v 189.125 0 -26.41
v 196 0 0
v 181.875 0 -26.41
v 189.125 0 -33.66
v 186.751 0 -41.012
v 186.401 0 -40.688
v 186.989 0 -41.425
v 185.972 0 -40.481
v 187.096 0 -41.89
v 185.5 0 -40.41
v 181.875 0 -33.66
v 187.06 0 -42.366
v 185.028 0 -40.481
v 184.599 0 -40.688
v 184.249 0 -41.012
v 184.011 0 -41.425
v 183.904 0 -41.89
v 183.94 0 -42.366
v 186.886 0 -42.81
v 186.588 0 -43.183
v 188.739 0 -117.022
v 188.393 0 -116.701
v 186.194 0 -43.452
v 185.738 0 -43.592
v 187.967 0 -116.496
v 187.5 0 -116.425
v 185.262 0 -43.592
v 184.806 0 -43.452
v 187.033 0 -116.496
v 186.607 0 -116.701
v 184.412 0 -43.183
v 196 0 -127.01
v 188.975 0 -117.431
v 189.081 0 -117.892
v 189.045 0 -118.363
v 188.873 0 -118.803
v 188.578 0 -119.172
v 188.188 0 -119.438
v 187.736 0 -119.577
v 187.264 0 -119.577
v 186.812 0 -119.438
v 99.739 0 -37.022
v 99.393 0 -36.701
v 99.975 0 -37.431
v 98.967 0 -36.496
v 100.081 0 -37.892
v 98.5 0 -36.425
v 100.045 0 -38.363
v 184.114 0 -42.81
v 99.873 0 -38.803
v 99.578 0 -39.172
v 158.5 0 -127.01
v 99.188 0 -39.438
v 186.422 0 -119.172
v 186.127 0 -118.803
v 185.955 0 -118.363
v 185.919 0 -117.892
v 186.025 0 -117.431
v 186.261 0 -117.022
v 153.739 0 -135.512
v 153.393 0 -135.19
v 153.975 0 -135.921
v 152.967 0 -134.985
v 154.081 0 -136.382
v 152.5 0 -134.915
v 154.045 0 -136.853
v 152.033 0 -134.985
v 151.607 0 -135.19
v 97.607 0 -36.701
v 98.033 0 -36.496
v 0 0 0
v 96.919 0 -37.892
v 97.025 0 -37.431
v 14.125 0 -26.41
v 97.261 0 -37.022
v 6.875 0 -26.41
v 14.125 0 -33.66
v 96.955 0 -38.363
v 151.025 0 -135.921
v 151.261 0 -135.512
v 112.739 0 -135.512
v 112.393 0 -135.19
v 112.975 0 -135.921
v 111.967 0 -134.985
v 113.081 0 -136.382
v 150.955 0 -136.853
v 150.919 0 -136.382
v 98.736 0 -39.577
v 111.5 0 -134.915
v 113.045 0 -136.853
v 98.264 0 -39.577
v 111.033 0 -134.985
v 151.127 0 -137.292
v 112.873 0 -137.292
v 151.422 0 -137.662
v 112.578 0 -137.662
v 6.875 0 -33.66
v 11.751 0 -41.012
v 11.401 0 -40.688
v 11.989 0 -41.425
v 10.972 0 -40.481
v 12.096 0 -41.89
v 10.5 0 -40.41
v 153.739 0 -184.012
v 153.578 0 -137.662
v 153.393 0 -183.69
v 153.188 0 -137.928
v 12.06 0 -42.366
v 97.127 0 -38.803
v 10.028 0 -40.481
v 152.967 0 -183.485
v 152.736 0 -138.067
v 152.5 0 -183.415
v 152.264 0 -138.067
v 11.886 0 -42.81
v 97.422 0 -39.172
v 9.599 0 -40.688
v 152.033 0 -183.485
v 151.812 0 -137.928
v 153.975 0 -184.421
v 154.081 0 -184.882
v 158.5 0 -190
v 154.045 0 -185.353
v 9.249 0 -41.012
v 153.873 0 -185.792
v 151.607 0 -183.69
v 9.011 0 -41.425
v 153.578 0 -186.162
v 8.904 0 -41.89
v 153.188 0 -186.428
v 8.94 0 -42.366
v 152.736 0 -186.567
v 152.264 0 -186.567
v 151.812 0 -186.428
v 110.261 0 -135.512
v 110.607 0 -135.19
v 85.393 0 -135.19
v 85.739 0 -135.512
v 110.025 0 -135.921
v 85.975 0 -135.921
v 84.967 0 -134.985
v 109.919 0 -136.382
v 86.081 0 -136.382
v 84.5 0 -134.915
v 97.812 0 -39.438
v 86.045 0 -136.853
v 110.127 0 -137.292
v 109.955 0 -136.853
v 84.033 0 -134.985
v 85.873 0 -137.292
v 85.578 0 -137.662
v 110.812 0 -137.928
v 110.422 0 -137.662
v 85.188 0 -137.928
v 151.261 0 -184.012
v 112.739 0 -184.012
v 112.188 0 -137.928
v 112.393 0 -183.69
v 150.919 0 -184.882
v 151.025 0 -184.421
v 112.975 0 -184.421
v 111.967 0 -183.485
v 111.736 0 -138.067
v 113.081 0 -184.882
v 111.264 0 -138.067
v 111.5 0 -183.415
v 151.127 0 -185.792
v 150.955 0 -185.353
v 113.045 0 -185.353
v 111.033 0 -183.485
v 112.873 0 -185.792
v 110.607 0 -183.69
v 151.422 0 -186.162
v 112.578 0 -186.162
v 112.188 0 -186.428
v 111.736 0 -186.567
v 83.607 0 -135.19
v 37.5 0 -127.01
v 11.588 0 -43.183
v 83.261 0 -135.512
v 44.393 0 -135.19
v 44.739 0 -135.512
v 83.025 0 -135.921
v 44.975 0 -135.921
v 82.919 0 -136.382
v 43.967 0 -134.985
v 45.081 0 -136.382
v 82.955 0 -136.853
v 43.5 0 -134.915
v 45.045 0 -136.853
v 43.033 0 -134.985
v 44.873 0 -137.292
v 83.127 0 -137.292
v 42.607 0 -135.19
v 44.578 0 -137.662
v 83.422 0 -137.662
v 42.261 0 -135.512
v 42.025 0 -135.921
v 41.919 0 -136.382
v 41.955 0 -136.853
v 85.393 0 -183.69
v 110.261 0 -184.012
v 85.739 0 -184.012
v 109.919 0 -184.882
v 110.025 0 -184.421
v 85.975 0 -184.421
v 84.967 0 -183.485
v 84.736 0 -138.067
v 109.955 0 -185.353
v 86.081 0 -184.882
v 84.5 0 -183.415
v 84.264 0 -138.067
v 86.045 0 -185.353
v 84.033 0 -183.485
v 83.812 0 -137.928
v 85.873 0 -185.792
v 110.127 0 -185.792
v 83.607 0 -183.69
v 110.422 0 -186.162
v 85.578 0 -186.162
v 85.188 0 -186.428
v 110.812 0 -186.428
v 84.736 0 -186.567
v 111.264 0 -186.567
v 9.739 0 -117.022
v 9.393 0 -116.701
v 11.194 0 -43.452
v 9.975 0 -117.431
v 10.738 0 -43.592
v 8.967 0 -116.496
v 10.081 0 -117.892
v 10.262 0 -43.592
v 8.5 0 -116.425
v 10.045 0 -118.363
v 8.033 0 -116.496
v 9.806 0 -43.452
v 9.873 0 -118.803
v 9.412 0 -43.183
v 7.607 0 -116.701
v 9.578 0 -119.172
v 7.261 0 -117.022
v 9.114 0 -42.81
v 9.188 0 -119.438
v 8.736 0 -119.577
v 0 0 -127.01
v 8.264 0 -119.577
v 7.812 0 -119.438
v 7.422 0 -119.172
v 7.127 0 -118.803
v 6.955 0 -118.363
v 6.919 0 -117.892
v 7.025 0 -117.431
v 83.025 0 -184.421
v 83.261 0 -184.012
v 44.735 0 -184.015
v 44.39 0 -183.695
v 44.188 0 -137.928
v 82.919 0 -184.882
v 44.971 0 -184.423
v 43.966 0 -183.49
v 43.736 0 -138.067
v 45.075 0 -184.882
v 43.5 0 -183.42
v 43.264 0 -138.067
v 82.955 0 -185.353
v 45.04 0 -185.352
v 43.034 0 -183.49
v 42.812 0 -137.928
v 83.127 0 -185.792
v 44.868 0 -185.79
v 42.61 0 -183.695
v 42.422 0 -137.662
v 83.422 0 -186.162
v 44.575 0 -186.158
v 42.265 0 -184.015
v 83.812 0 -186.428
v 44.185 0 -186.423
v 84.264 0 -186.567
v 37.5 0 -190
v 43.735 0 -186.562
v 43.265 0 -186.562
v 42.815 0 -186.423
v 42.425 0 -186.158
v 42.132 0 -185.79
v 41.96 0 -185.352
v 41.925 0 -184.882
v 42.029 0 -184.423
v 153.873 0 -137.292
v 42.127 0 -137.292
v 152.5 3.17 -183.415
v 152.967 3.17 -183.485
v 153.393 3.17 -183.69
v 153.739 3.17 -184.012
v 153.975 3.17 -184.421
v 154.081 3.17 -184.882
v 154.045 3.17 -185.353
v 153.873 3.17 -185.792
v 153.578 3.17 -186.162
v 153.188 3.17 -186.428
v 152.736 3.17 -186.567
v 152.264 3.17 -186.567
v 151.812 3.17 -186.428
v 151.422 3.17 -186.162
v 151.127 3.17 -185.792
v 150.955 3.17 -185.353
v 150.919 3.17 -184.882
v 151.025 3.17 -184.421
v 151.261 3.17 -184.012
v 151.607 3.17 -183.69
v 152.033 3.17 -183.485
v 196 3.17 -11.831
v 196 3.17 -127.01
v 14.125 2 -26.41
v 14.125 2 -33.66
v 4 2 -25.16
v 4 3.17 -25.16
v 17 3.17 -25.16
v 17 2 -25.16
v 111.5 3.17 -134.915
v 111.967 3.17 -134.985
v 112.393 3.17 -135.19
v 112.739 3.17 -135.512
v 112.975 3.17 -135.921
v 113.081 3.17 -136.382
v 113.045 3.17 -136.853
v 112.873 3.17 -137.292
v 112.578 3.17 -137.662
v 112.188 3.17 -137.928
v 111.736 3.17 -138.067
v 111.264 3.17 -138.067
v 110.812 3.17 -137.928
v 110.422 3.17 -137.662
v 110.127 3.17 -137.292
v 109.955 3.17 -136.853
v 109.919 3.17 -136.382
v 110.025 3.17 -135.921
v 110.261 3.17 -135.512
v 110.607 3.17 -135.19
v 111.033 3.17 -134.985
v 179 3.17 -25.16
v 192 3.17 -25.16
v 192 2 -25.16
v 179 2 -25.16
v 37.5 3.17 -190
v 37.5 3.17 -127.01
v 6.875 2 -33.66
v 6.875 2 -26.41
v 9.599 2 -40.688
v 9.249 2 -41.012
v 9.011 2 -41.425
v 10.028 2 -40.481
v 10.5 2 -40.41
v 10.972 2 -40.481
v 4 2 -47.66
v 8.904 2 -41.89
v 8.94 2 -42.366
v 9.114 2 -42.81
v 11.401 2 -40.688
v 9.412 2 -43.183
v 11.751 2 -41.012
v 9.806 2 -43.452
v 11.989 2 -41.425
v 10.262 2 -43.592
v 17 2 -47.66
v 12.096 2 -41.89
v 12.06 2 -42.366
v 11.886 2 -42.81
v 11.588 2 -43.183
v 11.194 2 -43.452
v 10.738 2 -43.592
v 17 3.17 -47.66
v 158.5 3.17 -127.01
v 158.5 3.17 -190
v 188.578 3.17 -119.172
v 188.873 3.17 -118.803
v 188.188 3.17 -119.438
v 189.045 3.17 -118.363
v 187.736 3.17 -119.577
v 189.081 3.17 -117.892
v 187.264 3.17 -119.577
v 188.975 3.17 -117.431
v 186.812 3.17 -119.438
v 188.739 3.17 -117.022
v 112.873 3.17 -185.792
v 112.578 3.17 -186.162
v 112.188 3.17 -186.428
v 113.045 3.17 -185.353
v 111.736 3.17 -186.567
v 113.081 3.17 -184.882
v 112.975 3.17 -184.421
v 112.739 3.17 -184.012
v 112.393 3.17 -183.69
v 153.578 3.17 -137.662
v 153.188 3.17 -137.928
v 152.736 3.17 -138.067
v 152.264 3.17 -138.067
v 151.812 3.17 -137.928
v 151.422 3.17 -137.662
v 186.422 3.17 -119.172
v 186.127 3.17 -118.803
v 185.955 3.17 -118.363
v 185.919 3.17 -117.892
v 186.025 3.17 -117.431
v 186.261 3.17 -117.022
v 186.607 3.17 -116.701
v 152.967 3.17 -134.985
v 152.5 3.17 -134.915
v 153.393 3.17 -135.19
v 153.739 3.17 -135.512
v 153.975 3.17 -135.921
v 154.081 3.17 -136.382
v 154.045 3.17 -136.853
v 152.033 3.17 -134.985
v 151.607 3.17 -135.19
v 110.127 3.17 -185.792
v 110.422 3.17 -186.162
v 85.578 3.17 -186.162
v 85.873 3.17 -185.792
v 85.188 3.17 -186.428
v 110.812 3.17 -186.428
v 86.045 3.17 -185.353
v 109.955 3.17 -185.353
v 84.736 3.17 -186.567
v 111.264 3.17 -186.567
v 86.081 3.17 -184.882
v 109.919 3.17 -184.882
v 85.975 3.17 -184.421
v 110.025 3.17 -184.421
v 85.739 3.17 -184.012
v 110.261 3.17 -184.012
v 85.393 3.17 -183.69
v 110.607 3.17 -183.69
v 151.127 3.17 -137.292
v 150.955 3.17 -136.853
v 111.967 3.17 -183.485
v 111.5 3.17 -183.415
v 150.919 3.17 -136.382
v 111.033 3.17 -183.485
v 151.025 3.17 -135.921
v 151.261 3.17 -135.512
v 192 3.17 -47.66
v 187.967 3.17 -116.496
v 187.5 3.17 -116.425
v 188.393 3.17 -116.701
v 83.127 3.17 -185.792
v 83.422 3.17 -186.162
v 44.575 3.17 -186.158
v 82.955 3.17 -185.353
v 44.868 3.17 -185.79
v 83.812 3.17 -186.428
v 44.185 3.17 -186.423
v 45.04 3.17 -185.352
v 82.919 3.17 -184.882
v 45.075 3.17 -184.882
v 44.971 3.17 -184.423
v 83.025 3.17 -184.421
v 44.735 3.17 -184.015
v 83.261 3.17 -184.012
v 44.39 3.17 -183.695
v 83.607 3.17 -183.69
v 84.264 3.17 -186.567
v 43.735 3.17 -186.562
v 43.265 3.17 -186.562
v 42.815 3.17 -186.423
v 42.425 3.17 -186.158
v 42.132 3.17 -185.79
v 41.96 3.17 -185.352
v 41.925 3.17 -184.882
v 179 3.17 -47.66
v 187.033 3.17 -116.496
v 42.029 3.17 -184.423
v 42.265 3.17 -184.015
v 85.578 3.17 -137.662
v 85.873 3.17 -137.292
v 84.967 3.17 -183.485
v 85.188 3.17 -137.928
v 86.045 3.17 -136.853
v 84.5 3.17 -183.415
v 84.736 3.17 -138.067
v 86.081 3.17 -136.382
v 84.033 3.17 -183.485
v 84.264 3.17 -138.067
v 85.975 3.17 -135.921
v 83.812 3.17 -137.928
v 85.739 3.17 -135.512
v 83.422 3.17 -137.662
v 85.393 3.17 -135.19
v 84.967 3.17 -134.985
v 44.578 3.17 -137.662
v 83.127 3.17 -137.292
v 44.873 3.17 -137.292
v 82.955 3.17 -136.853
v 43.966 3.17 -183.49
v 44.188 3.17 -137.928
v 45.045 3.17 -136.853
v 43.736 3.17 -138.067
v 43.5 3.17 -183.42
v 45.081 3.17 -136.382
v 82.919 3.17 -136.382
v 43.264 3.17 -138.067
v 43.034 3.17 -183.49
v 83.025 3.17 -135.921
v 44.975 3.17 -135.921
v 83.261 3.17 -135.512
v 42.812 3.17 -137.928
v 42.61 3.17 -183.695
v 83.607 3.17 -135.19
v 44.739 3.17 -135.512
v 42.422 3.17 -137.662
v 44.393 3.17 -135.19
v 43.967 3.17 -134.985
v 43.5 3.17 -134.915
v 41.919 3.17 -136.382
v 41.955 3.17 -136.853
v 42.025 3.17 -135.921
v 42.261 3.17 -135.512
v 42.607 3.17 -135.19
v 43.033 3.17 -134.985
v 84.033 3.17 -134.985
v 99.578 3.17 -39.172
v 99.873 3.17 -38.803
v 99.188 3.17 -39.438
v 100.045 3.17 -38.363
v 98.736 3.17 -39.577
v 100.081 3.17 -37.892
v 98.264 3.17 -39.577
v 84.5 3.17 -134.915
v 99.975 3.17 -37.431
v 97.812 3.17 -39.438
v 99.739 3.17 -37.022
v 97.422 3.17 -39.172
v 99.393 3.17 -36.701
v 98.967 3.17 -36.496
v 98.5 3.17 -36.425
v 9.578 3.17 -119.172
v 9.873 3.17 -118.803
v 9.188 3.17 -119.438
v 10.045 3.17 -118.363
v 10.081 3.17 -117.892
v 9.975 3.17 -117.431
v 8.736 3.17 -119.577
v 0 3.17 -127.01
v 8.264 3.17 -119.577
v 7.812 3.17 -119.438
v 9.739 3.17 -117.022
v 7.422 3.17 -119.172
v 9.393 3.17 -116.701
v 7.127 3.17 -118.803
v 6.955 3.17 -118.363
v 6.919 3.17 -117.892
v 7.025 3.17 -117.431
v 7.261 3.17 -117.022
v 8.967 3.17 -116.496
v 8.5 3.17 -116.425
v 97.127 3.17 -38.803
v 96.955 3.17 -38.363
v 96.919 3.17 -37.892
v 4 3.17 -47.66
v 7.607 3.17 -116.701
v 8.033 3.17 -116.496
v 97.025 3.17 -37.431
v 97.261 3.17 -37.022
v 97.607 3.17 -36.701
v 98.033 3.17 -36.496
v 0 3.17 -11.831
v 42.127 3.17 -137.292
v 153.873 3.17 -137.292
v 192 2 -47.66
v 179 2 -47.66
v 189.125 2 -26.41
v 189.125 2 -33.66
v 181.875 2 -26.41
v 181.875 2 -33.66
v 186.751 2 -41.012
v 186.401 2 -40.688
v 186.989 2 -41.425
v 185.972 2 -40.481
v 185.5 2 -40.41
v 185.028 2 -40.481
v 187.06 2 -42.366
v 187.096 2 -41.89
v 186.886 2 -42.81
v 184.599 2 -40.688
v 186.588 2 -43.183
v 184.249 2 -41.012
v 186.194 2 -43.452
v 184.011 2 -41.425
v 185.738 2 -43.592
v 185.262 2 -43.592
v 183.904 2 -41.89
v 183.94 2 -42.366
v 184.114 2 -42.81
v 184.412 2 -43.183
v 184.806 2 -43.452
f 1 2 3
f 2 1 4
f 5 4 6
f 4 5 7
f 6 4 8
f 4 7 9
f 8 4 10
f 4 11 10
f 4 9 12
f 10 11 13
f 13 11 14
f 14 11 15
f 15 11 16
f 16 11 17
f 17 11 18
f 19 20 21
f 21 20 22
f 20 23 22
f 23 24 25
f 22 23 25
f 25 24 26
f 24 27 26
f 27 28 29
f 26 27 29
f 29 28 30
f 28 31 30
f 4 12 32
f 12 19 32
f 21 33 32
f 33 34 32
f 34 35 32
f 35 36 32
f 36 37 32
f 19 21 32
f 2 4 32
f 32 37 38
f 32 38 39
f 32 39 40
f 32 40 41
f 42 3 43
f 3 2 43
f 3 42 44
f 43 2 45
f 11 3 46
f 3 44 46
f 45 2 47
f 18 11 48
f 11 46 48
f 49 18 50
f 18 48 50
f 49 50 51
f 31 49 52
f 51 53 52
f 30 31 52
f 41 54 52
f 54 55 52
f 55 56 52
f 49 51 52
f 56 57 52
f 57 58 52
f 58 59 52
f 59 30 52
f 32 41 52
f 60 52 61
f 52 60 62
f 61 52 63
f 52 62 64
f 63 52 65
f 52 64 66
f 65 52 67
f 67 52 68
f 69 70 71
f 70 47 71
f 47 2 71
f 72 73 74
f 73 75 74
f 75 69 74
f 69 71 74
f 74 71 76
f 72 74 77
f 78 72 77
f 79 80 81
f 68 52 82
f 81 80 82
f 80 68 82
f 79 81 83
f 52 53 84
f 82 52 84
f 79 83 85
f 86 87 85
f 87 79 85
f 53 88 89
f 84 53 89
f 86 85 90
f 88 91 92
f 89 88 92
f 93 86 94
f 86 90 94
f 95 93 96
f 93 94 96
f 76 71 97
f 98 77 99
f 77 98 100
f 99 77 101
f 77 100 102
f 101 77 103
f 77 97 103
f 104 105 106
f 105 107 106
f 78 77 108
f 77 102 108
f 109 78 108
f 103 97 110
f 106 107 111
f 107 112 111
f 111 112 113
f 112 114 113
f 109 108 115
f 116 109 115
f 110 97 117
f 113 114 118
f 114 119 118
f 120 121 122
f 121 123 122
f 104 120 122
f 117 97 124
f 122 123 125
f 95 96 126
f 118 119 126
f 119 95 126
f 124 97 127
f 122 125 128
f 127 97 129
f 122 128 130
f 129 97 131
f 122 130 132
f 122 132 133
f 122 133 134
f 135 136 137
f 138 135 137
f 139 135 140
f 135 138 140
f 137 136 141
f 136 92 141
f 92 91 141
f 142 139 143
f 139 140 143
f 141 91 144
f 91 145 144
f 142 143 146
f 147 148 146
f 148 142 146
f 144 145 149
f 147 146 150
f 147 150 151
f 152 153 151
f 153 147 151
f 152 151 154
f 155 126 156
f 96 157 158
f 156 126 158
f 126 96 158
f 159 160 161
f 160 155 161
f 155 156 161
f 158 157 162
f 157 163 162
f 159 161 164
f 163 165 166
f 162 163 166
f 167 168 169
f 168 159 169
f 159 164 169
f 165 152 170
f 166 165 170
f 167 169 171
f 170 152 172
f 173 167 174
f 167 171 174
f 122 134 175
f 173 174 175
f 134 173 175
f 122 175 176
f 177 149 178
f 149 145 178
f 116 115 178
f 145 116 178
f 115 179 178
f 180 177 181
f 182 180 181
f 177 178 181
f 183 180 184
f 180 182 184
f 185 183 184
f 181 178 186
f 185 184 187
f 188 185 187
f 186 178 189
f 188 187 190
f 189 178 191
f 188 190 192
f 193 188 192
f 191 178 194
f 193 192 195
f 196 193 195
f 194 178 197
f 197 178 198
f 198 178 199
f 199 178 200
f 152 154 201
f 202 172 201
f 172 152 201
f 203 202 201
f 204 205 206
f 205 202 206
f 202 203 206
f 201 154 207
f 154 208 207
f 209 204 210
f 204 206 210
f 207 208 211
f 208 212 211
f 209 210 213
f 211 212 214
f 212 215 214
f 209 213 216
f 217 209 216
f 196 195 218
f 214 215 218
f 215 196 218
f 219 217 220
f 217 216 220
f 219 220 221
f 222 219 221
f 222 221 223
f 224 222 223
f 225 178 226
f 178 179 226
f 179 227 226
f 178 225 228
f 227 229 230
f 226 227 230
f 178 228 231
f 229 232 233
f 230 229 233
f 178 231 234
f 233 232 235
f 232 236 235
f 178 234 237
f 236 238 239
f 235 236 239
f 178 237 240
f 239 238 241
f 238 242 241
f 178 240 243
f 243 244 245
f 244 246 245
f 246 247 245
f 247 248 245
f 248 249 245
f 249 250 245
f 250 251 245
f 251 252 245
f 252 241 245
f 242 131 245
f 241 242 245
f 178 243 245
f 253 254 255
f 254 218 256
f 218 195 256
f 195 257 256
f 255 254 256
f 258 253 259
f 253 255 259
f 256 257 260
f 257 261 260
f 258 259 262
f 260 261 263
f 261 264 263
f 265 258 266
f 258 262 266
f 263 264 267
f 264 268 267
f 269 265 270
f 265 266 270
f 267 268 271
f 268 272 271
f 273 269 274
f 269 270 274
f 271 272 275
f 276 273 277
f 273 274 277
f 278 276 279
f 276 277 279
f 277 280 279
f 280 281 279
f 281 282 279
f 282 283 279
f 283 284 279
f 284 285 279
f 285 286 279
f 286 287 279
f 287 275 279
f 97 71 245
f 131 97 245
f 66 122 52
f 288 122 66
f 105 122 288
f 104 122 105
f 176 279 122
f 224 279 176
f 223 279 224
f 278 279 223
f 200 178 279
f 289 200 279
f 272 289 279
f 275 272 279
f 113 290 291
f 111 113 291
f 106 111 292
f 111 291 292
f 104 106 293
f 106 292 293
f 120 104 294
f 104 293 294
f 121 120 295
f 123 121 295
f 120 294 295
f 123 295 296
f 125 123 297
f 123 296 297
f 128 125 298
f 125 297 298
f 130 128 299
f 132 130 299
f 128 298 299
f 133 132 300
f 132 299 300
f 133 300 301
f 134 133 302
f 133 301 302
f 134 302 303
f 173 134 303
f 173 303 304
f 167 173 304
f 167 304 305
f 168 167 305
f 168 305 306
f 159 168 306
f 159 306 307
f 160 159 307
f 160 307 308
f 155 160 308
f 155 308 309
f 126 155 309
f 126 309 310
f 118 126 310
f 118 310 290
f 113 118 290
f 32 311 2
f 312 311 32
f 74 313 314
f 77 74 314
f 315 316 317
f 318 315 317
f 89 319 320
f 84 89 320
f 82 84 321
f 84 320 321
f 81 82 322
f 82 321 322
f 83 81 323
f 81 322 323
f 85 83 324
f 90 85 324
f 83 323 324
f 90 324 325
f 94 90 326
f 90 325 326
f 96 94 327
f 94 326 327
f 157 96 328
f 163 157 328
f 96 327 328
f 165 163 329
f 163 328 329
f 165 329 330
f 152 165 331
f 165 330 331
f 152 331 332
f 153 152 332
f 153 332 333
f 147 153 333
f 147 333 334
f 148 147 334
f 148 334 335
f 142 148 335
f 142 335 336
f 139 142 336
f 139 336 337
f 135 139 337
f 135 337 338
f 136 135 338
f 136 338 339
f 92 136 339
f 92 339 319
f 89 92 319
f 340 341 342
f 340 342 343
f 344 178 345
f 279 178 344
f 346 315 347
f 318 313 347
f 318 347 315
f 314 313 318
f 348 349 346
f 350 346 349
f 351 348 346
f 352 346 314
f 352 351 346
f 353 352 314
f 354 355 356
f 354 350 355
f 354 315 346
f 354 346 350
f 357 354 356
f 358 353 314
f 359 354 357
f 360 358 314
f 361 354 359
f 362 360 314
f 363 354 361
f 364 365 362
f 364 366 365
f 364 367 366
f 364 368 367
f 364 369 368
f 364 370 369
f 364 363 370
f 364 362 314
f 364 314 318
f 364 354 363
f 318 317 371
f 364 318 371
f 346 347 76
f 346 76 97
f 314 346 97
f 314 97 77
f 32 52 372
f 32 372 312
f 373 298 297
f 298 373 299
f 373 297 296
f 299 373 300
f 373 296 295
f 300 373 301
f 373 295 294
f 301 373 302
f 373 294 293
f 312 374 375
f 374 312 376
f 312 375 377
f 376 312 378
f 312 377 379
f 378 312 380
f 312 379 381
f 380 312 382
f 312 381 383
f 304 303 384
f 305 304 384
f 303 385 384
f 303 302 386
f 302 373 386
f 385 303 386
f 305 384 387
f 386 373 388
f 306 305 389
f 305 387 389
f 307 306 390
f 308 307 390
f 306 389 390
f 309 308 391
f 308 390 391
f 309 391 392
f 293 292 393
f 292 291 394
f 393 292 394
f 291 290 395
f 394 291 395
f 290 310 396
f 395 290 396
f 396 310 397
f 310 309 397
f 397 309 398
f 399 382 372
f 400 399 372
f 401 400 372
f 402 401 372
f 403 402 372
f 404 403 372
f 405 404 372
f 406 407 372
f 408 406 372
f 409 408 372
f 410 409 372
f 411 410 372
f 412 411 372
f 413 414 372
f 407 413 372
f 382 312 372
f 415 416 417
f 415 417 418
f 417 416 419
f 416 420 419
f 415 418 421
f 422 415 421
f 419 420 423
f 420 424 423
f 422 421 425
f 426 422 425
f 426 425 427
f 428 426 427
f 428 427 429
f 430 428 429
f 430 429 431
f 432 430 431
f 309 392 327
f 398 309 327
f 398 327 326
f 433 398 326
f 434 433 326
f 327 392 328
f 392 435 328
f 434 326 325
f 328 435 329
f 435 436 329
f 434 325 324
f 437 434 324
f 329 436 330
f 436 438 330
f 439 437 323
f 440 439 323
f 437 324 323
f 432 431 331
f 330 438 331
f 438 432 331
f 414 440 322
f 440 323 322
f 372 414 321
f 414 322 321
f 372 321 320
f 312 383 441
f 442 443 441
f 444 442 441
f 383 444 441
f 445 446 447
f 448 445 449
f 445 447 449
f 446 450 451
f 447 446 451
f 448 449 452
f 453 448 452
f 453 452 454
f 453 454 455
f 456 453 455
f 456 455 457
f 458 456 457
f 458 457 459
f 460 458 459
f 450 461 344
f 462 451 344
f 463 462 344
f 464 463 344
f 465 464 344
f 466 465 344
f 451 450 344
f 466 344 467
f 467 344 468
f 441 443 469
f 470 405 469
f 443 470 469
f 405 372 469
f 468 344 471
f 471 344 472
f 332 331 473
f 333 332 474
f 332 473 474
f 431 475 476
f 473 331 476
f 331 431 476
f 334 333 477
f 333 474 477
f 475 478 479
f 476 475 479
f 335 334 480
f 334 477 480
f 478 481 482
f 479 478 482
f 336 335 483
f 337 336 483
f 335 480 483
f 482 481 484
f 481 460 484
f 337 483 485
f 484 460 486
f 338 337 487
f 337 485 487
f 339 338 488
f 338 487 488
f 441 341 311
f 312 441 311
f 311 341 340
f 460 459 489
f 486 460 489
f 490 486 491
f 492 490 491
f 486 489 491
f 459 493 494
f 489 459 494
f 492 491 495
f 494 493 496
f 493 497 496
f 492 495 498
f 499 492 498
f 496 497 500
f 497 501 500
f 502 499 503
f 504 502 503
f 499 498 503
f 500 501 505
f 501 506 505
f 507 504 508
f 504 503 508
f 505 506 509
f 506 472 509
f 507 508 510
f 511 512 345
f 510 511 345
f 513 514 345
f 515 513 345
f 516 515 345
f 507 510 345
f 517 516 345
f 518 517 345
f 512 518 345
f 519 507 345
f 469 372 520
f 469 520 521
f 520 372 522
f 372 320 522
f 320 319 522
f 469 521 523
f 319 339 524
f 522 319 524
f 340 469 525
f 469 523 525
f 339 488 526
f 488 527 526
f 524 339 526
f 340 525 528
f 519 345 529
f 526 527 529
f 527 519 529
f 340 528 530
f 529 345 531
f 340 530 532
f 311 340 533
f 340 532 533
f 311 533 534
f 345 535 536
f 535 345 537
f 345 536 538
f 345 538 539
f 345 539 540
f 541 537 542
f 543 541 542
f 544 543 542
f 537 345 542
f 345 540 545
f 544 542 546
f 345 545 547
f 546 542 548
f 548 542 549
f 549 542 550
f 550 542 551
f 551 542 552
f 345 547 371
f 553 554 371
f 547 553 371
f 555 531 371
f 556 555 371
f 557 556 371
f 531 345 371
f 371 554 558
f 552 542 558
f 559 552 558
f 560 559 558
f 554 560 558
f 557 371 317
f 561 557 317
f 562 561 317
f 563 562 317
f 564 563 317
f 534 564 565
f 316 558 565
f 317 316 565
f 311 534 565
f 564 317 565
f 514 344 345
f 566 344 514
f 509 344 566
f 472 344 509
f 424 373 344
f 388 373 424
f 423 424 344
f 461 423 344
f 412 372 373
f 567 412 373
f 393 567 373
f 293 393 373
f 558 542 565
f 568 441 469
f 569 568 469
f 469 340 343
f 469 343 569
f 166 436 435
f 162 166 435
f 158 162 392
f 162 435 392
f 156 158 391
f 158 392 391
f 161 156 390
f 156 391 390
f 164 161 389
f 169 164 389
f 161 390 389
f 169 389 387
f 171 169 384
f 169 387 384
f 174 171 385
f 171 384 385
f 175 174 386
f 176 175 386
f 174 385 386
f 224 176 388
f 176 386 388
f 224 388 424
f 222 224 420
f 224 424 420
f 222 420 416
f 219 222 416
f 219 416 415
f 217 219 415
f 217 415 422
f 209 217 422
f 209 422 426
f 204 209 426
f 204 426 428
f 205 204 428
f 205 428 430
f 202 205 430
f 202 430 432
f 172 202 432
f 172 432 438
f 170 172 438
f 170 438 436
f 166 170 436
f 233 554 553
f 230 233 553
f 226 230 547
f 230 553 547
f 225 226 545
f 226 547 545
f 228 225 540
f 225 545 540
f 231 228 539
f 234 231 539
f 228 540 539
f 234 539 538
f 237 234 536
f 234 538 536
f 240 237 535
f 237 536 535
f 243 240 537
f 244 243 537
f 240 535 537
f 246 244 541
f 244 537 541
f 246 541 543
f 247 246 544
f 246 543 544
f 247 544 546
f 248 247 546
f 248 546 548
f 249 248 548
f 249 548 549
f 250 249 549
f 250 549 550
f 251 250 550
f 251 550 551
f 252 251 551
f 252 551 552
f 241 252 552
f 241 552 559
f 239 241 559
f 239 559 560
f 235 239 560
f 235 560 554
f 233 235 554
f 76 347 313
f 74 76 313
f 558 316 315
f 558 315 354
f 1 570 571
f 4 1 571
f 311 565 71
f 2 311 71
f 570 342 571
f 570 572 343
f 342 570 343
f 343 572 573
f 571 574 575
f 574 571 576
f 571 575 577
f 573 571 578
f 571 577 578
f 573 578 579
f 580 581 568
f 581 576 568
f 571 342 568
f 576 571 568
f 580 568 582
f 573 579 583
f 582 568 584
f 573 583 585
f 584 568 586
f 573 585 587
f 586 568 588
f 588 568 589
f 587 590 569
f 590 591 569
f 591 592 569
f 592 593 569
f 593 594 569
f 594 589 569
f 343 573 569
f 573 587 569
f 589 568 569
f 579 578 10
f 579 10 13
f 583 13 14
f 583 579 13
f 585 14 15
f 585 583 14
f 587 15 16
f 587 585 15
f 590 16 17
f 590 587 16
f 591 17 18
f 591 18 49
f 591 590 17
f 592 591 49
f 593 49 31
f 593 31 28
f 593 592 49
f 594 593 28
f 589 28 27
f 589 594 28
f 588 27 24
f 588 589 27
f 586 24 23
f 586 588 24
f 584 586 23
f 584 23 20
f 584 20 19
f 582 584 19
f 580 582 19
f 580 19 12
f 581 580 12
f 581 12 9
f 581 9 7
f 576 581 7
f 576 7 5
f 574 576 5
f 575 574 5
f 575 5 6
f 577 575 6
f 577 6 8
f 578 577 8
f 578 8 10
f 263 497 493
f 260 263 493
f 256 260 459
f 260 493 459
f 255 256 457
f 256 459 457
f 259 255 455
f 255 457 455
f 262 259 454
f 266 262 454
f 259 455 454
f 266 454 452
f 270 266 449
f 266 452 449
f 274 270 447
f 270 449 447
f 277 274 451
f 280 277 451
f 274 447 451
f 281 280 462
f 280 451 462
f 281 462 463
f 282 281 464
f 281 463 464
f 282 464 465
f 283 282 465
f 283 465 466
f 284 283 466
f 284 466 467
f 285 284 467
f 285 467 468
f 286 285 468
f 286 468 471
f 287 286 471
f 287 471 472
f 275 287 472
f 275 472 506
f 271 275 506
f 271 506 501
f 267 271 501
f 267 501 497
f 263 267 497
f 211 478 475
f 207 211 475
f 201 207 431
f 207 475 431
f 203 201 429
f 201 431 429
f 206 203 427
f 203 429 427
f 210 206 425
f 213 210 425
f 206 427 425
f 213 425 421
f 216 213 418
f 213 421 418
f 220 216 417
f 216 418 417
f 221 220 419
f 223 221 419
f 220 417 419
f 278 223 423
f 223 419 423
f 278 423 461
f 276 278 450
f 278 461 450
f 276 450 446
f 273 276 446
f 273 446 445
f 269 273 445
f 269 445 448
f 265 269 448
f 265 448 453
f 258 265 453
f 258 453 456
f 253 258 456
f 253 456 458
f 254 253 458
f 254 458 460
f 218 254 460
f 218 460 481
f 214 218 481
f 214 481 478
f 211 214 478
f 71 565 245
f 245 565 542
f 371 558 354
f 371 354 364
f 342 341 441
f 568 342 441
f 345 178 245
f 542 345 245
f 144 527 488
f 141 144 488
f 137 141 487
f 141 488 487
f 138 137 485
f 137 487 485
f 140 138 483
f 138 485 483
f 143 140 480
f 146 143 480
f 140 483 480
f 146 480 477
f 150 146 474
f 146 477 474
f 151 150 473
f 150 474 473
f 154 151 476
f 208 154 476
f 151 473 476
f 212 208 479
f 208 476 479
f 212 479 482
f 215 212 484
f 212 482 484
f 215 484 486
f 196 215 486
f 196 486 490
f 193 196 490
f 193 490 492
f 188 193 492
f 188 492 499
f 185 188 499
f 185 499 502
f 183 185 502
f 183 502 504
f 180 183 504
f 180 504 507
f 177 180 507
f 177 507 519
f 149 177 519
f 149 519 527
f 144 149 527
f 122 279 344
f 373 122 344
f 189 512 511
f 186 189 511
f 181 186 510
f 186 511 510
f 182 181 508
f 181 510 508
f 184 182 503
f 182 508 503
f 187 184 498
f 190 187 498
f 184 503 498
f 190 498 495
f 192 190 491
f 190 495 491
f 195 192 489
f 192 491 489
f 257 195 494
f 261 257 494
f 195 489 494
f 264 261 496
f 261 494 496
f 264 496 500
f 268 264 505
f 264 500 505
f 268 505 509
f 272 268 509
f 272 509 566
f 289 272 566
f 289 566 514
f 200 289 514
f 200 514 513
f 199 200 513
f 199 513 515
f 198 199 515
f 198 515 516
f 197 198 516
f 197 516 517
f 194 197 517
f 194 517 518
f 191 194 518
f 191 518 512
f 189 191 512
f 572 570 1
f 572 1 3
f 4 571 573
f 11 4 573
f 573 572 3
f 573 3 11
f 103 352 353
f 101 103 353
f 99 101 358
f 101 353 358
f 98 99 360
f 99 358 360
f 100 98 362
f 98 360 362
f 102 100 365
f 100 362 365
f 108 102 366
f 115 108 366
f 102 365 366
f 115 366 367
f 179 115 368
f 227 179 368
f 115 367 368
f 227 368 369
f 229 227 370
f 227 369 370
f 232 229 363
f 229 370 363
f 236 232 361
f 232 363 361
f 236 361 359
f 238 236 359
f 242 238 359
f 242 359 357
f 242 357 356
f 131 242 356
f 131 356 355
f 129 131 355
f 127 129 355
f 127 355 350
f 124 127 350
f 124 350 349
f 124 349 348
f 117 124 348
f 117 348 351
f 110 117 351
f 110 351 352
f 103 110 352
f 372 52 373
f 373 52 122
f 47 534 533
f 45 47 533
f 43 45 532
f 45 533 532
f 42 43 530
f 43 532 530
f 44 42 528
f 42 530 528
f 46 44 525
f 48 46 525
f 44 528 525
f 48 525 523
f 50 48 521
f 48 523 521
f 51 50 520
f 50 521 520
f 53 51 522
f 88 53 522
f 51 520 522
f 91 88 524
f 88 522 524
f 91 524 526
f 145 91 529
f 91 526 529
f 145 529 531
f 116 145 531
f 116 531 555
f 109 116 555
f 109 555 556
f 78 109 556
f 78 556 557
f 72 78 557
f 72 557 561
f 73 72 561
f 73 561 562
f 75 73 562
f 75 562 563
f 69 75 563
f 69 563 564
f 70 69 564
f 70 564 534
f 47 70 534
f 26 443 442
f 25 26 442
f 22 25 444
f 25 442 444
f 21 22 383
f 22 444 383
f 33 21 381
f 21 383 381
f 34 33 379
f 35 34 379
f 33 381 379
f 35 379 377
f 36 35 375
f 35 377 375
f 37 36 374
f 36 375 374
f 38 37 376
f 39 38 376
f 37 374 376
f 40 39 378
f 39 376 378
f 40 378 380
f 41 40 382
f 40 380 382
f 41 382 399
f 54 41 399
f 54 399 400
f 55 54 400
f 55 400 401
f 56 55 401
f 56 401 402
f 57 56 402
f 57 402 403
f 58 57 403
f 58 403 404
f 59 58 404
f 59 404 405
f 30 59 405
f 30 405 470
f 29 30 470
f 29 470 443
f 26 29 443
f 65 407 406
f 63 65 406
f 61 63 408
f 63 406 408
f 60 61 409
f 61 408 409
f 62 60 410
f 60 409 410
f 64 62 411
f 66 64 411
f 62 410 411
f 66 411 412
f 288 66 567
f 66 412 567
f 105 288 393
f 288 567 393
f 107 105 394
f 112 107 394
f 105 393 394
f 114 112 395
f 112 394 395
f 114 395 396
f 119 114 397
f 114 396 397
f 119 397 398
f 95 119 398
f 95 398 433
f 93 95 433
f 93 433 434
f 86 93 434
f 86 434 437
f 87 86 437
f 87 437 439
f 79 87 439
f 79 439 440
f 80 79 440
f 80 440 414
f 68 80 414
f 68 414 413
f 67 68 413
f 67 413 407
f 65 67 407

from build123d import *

# Parameters (mm, degrees)
SALIENTE_EXTRUIR1_DEPTH = 196
CORTAR_EXTRUIR1_REACH   = 274.995
CROQUIS2_W              = 37.5
CROQUIS2_H              = 62.989872981
CROQUIS3_W              = 13
CROQUIS3_H              = 22.5
CORTAR_EXTRUIR2_DEPTH   = 1.17
CORTAR_EXTRUIR3_REACH   = 274.984
CROQUIS5_W              = 7.25
CROQUIS5_H              = 7.25
CORTAR_EXTRUIR4_REACH   = 274.984
CROQUIS6_R              = 1.6
CUT_EXTRUDE1_REACH      = 274.995
SKETCH1_R               = 1.585
CUT_EXTRUDE2_REACH      = 274.995
SKETCH2_R               = 1.585
CUT_EXTRUDE3_REACH      = 274.995
SKETCH3_R               = 1.579889923
SKETCH3_R_2             = 1.585


with BuildPart() as part:
    # Croquis1 → Saliente-Extruir1 (new body)
    with BuildSketch(Plane(origin=(0, 0, 0), x_dir=(0, 0, -1), z_dir=(1, 0, 0))):
        Polygon((0, 0), (190, 0), (190, 3.17), (11.83060106, 3.17), align=None)
    extrude(amount=SALIENTE_EXTRUIR1_DEPTH)

    # Croquis2 → Cortar-Extruir1 (cut, up to next)
    with BuildSketch(Plane(origin=(0, 0, 0), x_dir=(-1, 0, 0), z_dir=(0, -1, 0)), mode=Mode.PRIVATE) as cortar_extruir1_sk1:
        with Locations((-18.75, 158.50506351)):
            Rectangle(CROQUIS2_W, CROQUIS2_H)
    cortar_extruir1_tool1 = extrude(cortar_extruir1_sk1.sketch, amount=-CORTAR_EXTRUIR1_REACH, mode=Mode.PRIVATE) & part.part
    cortar_extruir1 = cortar_extruir1_tool1.solids().sort_by_distance((18.75, 0, -158.505064))[0]
    add(cortar_extruir1, mode=Mode.SUBTRACT)

    # Simetría1: Cortar-Extruir1 across plane
    add(cortar_extruir1.mirror(Plane.ZY.offset(-98)), mode=Mode.SUBTRACT)

    # Croquis3 → Cortar-Extruir2 (cut)
    with BuildSketch(Plane(origin=(0, 3.17, 0), x_dir=(1, 0, 0), z_dir=(0, 1, 0))):
        with Locations((10.5, 36.41)):
            Rectangle(CROQUIS3_W, CROQUIS3_H)
    cortar_extruir2 = extrude(amount=-CORTAR_EXTRUIR2_DEPTH, mode=Mode.SUBTRACT)

    # Croquis5 → Cortar-Extruir3 (cut, up to next)
    with BuildSketch(Plane(origin=(0, 2, 0), x_dir=(1, 0, 0), z_dir=(0, 1, 0)), mode=Mode.PRIVATE) as cortar_extruir3_sk1:
        with Locations((10.5, 30.035)):
            Rectangle(CROQUIS5_W, CROQUIS5_H)
    cortar_extruir3_tool1 = extrude(cortar_extruir3_sk1.sketch, amount=-CORTAR_EXTRUIR3_REACH, mode=Mode.PRIVATE) & part.part
    cortar_extruir3 = cortar_extruir3_tool1.solids().sort_by_distance((10.5, 2, -30.035))[0]
    add(cortar_extruir3, mode=Mode.SUBTRACT)

    # Croquis6 → Cortar-Extruir4 (cut, up to next)
    with BuildSketch(Plane(origin=(0, 2, 0), x_dir=(1, 0, 0), z_dir=(0, 1, 0)), mode=Mode.PRIVATE) as cortar_extruir4_sk1:
        with Locations(Location((10.5, 42.01, 0), (0, 0, 270))):
            Circle(CROQUIS6_R)
    cortar_extruir4_tool1 = extrude(cortar_extruir4_sk1.sketch, amount=-CORTAR_EXTRUIR4_REACH, mode=Mode.PRIVATE) & part.part
    cortar_extruir4 = cortar_extruir4_tool1.solids().sort_by_distance((10.5, 2, -42.01))[0]
    add(cortar_extruir4, mode=Mode.SUBTRACT)

    # Simetría2: Cortar-Extruir2, Cortar-Extruir3, Cortar-Extruir4 across plane
    add(cortar_extruir2.mirror(Plane.ZY.offset(-98)), mode=Mode.SUBTRACT)
    add(cortar_extruir3.mirror(Plane.ZY.offset(-98)), mode=Mode.SUBTRACT)
    add(cortar_extruir4.mirror(Plane.ZY.offset(-98)), mode=Mode.SUBTRACT)

    # Sketch1 → Cut-Extrude1 (cut, up to next)
    with BuildSketch(Plane(origin=(0, 3.17, 0), x_dir=(1, 0, 0), z_dir=(0, 1, 0)), mode=Mode.PRIVATE) as cut_extrude1_sk1:
        with Locations(Location((8.5, 118.010127019, 0), (0, 0, 270))):
            Circle(SKETCH1_R)
    cut_extrude1_tool1 = extrude(cut_extrude1_sk1.sketch, amount=-CUT_EXTRUDE1_REACH, mode=Mode.PRIVATE) & part.part
    # Sketch1 → Cut-Extrude1 (cut, up to next)
    with BuildSketch(Plane(origin=(0, 3.17, 0), x_dir=(1, 0, 0), z_dir=(0, 1, 0)), mode=Mode.PRIVATE) as cut_extrude1_sk2:
        with Locations(Location((187.5, 118.010127019, 0), (0, 0, 270))):
            Circle(SKETCH1_R)
    cut_extrude1_tool2 = extrude(cut_extrude1_sk2.sketch, amount=-CUT_EXTRUDE1_REACH, mode=Mode.PRIVATE) & part.part
    add(cut_extrude1_tool1.solids().sort_by_distance((8.5, 3.17, -118.010127))[0], mode=Mode.SUBTRACT)
    add(cut_extrude1_tool2.solids().sort_by_distance((187.5, 3.17, -118.010127))[0], mode=Mode.SUBTRACT)

    # Sketch2 → Cut-Extrude2 (cut, up to next)
    with BuildSketch(Plane(origin=(0, 3.17, 0), x_dir=(1, 0, 0), z_dir=(0, 1, 0)), mode=Mode.PRIVATE) as cut_extrude2_sk1:
        with Locations(Location((98.5, 38.010127019, 0), (0, 0, 270))):
            Circle(SKETCH2_R)
    cut_extrude2_tool1 = extrude(cut_extrude2_sk1.sketch, amount=-CUT_EXTRUDE2_REACH, mode=Mode.PRIVATE) & part.part
    add(cut_extrude2_tool1.solids().sort_by_distance((98.5, 3.17, -38.010127))[0], mode=Mode.SUBTRACT)

    # Sketch3 → Cut-Extrude3 (cut, up to next)
    with BuildSketch(Plane(origin=(0, 3.17, 0), x_dir=(1, 0, 0), z_dir=(0, 1, 0)), mode=Mode.PRIVATE) as cut_extrude3_sk1:
        with Locations(Location((43.5, 185, 0), (0, 0, 270))):
            Circle(SKETCH3_R)
    cut_extrude3_tool1 = extrude(cut_extrude3_sk1.sketch, amount=-CUT_EXTRUDE3_REACH, mode=Mode.PRIVATE) & part.part
    # Sketch3 → Cut-Extrude3 (cut, up to next)
    with BuildSketch(Plane(origin=(0, 3.17, 0), x_dir=(1, 0, 0), z_dir=(0, 1, 0)), mode=Mode.PRIVATE) as cut_extrude3_sk2:
        with Locations(Location((84.5, 185, 0), (0, 0, 270))):
            Circle(SKETCH3_R_2)
    cut_extrude3_tool2 = extrude(cut_extrude3_sk2.sketch, amount=-CUT_EXTRUDE3_REACH, mode=Mode.PRIVATE) & part.part
    # Sketch3 → Cut-Extrude3 (cut, up to next)
    with BuildSketch(Plane(origin=(0, 3.17, 0), x_dir=(1, 0, 0), z_dir=(0, 1, 0)), mode=Mode.PRIVATE) as cut_extrude3_sk3:
        with Locations(Location((152.5, 185, 0), (0, 0, 270))):
            Circle(SKETCH3_R_2)
    cut_extrude3_tool3 = extrude(cut_extrude3_sk3.sketch, amount=-CUT_EXTRUDE3_REACH, mode=Mode.PRIVATE) & part.part
    # Sketch3 → Cut-Extrude3 (cut, up to next)
    with BuildSketch(Plane(origin=(0, 3.17, 0), x_dir=(1, 0, 0), z_dir=(0, 1, 0)), mode=Mode.PRIVATE) as cut_extrude3_sk4:
        with Locations(Location((111.5, 185, 0), (0, 0, 270))):
            Circle(SKETCH3_R_2)
    cut_extrude3_tool4 = extrude(cut_extrude3_sk4.sketch, amount=-CUT_EXTRUDE3_REACH, mode=Mode.PRIVATE) & part.part
    # Sketch3 → Cut-Extrude3 (cut, up to next)
    with BuildSketch(Plane(origin=(0, 3.17, 0), x_dir=(1, 0, 0), z_dir=(0, 1, 0)), mode=Mode.PRIVATE) as cut_extrude3_sk5:
        with Locations(Location((111.5, 136.5, 0), (0, 0, 270))):
            Circle(SKETCH3_R_2)
    cut_extrude3_tool5 = extrude(cut_extrude3_sk5.sketch, amount=-CUT_EXTRUDE3_REACH, mode=Mode.PRIVATE) & part.part
    # Sketch3 → Cut-Extrude3 (cut, up to next)
    with BuildSketch(Plane(origin=(0, 3.17, 0), x_dir=(1, 0, 0), z_dir=(0, 1, 0)), mode=Mode.PRIVATE) as cut_extrude3_sk6:
        with Locations(Location((152.5, 136.5, 0), (0, 0, 270))):
            Circle(SKETCH3_R_2)
    cut_extrude3_tool6 = extrude(cut_extrude3_sk6.sketch, amount=-CUT_EXTRUDE3_REACH, mode=Mode.PRIVATE) & part.part
    # Sketch3 → Cut-Extrude3 (cut, up to next)
    with BuildSketch(Plane(origin=(0, 3.17, 0), x_dir=(1, 0, 0), z_dir=(0, 1, 0)), mode=Mode.PRIVATE) as cut_extrude3_sk7:
        with Locations(Location((84.5, 136.5, 0), (0, 0, 270))):
            Circle(SKETCH3_R_2)
    cut_extrude3_tool7 = extrude(cut_extrude3_sk7.sketch, amount=-CUT_EXTRUDE3_REACH, mode=Mode.PRIVATE) & part.part
    # Sketch3 → Cut-Extrude3 (cut, up to next)
    with BuildSketch(Plane(origin=(0, 3.17, 0), x_dir=(1, 0, 0), z_dir=(0, 1, 0)), mode=Mode.PRIVATE) as cut_extrude3_sk8:
        with Locations(Location((43.5, 136.5, 0), (0, 0, 270))):
            Circle(SKETCH3_R_2)
    cut_extrude3_tool8 = extrude(cut_extrude3_sk8.sketch, amount=-CUT_EXTRUDE3_REACH, mode=Mode.PRIVATE) & part.part
    add(cut_extrude3_tool1.solids().sort_by_distance((43.5, 3.17, -185))[0], mode=Mode.SUBTRACT)
    add(cut_extrude3_tool2.solids().sort_by_distance((84.5, 3.17, -185))[0], mode=Mode.SUBTRACT)
    add(cut_extrude3_tool3.solids().sort_by_distance((152.5, 3.17, -185))[0], mode=Mode.SUBTRACT)
    add(cut_extrude3_tool4.solids().sort_by_distance((111.5, 3.17, -185))[0], mode=Mode.SUBTRACT)
    add(cut_extrude3_tool5.solids().sort_by_distance((111.5, 3.17, -136.5))[0], mode=Mode.SUBTRACT)
    add(cut_extrude3_tool6.solids().sort_by_distance((152.5, 3.17, -136.5))[0], mode=Mode.SUBTRACT)
    add(cut_extrude3_tool7.solids().sort_by_distance((84.5, 3.17, -136.5))[0], mode=Mode.SUBTRACT)
    add(cut_extrude3_tool8.solids().sort_by_distance((43.5, 3.17, -136.5))[0], mode=Mode.SUBTRACT)


solid = part.part
